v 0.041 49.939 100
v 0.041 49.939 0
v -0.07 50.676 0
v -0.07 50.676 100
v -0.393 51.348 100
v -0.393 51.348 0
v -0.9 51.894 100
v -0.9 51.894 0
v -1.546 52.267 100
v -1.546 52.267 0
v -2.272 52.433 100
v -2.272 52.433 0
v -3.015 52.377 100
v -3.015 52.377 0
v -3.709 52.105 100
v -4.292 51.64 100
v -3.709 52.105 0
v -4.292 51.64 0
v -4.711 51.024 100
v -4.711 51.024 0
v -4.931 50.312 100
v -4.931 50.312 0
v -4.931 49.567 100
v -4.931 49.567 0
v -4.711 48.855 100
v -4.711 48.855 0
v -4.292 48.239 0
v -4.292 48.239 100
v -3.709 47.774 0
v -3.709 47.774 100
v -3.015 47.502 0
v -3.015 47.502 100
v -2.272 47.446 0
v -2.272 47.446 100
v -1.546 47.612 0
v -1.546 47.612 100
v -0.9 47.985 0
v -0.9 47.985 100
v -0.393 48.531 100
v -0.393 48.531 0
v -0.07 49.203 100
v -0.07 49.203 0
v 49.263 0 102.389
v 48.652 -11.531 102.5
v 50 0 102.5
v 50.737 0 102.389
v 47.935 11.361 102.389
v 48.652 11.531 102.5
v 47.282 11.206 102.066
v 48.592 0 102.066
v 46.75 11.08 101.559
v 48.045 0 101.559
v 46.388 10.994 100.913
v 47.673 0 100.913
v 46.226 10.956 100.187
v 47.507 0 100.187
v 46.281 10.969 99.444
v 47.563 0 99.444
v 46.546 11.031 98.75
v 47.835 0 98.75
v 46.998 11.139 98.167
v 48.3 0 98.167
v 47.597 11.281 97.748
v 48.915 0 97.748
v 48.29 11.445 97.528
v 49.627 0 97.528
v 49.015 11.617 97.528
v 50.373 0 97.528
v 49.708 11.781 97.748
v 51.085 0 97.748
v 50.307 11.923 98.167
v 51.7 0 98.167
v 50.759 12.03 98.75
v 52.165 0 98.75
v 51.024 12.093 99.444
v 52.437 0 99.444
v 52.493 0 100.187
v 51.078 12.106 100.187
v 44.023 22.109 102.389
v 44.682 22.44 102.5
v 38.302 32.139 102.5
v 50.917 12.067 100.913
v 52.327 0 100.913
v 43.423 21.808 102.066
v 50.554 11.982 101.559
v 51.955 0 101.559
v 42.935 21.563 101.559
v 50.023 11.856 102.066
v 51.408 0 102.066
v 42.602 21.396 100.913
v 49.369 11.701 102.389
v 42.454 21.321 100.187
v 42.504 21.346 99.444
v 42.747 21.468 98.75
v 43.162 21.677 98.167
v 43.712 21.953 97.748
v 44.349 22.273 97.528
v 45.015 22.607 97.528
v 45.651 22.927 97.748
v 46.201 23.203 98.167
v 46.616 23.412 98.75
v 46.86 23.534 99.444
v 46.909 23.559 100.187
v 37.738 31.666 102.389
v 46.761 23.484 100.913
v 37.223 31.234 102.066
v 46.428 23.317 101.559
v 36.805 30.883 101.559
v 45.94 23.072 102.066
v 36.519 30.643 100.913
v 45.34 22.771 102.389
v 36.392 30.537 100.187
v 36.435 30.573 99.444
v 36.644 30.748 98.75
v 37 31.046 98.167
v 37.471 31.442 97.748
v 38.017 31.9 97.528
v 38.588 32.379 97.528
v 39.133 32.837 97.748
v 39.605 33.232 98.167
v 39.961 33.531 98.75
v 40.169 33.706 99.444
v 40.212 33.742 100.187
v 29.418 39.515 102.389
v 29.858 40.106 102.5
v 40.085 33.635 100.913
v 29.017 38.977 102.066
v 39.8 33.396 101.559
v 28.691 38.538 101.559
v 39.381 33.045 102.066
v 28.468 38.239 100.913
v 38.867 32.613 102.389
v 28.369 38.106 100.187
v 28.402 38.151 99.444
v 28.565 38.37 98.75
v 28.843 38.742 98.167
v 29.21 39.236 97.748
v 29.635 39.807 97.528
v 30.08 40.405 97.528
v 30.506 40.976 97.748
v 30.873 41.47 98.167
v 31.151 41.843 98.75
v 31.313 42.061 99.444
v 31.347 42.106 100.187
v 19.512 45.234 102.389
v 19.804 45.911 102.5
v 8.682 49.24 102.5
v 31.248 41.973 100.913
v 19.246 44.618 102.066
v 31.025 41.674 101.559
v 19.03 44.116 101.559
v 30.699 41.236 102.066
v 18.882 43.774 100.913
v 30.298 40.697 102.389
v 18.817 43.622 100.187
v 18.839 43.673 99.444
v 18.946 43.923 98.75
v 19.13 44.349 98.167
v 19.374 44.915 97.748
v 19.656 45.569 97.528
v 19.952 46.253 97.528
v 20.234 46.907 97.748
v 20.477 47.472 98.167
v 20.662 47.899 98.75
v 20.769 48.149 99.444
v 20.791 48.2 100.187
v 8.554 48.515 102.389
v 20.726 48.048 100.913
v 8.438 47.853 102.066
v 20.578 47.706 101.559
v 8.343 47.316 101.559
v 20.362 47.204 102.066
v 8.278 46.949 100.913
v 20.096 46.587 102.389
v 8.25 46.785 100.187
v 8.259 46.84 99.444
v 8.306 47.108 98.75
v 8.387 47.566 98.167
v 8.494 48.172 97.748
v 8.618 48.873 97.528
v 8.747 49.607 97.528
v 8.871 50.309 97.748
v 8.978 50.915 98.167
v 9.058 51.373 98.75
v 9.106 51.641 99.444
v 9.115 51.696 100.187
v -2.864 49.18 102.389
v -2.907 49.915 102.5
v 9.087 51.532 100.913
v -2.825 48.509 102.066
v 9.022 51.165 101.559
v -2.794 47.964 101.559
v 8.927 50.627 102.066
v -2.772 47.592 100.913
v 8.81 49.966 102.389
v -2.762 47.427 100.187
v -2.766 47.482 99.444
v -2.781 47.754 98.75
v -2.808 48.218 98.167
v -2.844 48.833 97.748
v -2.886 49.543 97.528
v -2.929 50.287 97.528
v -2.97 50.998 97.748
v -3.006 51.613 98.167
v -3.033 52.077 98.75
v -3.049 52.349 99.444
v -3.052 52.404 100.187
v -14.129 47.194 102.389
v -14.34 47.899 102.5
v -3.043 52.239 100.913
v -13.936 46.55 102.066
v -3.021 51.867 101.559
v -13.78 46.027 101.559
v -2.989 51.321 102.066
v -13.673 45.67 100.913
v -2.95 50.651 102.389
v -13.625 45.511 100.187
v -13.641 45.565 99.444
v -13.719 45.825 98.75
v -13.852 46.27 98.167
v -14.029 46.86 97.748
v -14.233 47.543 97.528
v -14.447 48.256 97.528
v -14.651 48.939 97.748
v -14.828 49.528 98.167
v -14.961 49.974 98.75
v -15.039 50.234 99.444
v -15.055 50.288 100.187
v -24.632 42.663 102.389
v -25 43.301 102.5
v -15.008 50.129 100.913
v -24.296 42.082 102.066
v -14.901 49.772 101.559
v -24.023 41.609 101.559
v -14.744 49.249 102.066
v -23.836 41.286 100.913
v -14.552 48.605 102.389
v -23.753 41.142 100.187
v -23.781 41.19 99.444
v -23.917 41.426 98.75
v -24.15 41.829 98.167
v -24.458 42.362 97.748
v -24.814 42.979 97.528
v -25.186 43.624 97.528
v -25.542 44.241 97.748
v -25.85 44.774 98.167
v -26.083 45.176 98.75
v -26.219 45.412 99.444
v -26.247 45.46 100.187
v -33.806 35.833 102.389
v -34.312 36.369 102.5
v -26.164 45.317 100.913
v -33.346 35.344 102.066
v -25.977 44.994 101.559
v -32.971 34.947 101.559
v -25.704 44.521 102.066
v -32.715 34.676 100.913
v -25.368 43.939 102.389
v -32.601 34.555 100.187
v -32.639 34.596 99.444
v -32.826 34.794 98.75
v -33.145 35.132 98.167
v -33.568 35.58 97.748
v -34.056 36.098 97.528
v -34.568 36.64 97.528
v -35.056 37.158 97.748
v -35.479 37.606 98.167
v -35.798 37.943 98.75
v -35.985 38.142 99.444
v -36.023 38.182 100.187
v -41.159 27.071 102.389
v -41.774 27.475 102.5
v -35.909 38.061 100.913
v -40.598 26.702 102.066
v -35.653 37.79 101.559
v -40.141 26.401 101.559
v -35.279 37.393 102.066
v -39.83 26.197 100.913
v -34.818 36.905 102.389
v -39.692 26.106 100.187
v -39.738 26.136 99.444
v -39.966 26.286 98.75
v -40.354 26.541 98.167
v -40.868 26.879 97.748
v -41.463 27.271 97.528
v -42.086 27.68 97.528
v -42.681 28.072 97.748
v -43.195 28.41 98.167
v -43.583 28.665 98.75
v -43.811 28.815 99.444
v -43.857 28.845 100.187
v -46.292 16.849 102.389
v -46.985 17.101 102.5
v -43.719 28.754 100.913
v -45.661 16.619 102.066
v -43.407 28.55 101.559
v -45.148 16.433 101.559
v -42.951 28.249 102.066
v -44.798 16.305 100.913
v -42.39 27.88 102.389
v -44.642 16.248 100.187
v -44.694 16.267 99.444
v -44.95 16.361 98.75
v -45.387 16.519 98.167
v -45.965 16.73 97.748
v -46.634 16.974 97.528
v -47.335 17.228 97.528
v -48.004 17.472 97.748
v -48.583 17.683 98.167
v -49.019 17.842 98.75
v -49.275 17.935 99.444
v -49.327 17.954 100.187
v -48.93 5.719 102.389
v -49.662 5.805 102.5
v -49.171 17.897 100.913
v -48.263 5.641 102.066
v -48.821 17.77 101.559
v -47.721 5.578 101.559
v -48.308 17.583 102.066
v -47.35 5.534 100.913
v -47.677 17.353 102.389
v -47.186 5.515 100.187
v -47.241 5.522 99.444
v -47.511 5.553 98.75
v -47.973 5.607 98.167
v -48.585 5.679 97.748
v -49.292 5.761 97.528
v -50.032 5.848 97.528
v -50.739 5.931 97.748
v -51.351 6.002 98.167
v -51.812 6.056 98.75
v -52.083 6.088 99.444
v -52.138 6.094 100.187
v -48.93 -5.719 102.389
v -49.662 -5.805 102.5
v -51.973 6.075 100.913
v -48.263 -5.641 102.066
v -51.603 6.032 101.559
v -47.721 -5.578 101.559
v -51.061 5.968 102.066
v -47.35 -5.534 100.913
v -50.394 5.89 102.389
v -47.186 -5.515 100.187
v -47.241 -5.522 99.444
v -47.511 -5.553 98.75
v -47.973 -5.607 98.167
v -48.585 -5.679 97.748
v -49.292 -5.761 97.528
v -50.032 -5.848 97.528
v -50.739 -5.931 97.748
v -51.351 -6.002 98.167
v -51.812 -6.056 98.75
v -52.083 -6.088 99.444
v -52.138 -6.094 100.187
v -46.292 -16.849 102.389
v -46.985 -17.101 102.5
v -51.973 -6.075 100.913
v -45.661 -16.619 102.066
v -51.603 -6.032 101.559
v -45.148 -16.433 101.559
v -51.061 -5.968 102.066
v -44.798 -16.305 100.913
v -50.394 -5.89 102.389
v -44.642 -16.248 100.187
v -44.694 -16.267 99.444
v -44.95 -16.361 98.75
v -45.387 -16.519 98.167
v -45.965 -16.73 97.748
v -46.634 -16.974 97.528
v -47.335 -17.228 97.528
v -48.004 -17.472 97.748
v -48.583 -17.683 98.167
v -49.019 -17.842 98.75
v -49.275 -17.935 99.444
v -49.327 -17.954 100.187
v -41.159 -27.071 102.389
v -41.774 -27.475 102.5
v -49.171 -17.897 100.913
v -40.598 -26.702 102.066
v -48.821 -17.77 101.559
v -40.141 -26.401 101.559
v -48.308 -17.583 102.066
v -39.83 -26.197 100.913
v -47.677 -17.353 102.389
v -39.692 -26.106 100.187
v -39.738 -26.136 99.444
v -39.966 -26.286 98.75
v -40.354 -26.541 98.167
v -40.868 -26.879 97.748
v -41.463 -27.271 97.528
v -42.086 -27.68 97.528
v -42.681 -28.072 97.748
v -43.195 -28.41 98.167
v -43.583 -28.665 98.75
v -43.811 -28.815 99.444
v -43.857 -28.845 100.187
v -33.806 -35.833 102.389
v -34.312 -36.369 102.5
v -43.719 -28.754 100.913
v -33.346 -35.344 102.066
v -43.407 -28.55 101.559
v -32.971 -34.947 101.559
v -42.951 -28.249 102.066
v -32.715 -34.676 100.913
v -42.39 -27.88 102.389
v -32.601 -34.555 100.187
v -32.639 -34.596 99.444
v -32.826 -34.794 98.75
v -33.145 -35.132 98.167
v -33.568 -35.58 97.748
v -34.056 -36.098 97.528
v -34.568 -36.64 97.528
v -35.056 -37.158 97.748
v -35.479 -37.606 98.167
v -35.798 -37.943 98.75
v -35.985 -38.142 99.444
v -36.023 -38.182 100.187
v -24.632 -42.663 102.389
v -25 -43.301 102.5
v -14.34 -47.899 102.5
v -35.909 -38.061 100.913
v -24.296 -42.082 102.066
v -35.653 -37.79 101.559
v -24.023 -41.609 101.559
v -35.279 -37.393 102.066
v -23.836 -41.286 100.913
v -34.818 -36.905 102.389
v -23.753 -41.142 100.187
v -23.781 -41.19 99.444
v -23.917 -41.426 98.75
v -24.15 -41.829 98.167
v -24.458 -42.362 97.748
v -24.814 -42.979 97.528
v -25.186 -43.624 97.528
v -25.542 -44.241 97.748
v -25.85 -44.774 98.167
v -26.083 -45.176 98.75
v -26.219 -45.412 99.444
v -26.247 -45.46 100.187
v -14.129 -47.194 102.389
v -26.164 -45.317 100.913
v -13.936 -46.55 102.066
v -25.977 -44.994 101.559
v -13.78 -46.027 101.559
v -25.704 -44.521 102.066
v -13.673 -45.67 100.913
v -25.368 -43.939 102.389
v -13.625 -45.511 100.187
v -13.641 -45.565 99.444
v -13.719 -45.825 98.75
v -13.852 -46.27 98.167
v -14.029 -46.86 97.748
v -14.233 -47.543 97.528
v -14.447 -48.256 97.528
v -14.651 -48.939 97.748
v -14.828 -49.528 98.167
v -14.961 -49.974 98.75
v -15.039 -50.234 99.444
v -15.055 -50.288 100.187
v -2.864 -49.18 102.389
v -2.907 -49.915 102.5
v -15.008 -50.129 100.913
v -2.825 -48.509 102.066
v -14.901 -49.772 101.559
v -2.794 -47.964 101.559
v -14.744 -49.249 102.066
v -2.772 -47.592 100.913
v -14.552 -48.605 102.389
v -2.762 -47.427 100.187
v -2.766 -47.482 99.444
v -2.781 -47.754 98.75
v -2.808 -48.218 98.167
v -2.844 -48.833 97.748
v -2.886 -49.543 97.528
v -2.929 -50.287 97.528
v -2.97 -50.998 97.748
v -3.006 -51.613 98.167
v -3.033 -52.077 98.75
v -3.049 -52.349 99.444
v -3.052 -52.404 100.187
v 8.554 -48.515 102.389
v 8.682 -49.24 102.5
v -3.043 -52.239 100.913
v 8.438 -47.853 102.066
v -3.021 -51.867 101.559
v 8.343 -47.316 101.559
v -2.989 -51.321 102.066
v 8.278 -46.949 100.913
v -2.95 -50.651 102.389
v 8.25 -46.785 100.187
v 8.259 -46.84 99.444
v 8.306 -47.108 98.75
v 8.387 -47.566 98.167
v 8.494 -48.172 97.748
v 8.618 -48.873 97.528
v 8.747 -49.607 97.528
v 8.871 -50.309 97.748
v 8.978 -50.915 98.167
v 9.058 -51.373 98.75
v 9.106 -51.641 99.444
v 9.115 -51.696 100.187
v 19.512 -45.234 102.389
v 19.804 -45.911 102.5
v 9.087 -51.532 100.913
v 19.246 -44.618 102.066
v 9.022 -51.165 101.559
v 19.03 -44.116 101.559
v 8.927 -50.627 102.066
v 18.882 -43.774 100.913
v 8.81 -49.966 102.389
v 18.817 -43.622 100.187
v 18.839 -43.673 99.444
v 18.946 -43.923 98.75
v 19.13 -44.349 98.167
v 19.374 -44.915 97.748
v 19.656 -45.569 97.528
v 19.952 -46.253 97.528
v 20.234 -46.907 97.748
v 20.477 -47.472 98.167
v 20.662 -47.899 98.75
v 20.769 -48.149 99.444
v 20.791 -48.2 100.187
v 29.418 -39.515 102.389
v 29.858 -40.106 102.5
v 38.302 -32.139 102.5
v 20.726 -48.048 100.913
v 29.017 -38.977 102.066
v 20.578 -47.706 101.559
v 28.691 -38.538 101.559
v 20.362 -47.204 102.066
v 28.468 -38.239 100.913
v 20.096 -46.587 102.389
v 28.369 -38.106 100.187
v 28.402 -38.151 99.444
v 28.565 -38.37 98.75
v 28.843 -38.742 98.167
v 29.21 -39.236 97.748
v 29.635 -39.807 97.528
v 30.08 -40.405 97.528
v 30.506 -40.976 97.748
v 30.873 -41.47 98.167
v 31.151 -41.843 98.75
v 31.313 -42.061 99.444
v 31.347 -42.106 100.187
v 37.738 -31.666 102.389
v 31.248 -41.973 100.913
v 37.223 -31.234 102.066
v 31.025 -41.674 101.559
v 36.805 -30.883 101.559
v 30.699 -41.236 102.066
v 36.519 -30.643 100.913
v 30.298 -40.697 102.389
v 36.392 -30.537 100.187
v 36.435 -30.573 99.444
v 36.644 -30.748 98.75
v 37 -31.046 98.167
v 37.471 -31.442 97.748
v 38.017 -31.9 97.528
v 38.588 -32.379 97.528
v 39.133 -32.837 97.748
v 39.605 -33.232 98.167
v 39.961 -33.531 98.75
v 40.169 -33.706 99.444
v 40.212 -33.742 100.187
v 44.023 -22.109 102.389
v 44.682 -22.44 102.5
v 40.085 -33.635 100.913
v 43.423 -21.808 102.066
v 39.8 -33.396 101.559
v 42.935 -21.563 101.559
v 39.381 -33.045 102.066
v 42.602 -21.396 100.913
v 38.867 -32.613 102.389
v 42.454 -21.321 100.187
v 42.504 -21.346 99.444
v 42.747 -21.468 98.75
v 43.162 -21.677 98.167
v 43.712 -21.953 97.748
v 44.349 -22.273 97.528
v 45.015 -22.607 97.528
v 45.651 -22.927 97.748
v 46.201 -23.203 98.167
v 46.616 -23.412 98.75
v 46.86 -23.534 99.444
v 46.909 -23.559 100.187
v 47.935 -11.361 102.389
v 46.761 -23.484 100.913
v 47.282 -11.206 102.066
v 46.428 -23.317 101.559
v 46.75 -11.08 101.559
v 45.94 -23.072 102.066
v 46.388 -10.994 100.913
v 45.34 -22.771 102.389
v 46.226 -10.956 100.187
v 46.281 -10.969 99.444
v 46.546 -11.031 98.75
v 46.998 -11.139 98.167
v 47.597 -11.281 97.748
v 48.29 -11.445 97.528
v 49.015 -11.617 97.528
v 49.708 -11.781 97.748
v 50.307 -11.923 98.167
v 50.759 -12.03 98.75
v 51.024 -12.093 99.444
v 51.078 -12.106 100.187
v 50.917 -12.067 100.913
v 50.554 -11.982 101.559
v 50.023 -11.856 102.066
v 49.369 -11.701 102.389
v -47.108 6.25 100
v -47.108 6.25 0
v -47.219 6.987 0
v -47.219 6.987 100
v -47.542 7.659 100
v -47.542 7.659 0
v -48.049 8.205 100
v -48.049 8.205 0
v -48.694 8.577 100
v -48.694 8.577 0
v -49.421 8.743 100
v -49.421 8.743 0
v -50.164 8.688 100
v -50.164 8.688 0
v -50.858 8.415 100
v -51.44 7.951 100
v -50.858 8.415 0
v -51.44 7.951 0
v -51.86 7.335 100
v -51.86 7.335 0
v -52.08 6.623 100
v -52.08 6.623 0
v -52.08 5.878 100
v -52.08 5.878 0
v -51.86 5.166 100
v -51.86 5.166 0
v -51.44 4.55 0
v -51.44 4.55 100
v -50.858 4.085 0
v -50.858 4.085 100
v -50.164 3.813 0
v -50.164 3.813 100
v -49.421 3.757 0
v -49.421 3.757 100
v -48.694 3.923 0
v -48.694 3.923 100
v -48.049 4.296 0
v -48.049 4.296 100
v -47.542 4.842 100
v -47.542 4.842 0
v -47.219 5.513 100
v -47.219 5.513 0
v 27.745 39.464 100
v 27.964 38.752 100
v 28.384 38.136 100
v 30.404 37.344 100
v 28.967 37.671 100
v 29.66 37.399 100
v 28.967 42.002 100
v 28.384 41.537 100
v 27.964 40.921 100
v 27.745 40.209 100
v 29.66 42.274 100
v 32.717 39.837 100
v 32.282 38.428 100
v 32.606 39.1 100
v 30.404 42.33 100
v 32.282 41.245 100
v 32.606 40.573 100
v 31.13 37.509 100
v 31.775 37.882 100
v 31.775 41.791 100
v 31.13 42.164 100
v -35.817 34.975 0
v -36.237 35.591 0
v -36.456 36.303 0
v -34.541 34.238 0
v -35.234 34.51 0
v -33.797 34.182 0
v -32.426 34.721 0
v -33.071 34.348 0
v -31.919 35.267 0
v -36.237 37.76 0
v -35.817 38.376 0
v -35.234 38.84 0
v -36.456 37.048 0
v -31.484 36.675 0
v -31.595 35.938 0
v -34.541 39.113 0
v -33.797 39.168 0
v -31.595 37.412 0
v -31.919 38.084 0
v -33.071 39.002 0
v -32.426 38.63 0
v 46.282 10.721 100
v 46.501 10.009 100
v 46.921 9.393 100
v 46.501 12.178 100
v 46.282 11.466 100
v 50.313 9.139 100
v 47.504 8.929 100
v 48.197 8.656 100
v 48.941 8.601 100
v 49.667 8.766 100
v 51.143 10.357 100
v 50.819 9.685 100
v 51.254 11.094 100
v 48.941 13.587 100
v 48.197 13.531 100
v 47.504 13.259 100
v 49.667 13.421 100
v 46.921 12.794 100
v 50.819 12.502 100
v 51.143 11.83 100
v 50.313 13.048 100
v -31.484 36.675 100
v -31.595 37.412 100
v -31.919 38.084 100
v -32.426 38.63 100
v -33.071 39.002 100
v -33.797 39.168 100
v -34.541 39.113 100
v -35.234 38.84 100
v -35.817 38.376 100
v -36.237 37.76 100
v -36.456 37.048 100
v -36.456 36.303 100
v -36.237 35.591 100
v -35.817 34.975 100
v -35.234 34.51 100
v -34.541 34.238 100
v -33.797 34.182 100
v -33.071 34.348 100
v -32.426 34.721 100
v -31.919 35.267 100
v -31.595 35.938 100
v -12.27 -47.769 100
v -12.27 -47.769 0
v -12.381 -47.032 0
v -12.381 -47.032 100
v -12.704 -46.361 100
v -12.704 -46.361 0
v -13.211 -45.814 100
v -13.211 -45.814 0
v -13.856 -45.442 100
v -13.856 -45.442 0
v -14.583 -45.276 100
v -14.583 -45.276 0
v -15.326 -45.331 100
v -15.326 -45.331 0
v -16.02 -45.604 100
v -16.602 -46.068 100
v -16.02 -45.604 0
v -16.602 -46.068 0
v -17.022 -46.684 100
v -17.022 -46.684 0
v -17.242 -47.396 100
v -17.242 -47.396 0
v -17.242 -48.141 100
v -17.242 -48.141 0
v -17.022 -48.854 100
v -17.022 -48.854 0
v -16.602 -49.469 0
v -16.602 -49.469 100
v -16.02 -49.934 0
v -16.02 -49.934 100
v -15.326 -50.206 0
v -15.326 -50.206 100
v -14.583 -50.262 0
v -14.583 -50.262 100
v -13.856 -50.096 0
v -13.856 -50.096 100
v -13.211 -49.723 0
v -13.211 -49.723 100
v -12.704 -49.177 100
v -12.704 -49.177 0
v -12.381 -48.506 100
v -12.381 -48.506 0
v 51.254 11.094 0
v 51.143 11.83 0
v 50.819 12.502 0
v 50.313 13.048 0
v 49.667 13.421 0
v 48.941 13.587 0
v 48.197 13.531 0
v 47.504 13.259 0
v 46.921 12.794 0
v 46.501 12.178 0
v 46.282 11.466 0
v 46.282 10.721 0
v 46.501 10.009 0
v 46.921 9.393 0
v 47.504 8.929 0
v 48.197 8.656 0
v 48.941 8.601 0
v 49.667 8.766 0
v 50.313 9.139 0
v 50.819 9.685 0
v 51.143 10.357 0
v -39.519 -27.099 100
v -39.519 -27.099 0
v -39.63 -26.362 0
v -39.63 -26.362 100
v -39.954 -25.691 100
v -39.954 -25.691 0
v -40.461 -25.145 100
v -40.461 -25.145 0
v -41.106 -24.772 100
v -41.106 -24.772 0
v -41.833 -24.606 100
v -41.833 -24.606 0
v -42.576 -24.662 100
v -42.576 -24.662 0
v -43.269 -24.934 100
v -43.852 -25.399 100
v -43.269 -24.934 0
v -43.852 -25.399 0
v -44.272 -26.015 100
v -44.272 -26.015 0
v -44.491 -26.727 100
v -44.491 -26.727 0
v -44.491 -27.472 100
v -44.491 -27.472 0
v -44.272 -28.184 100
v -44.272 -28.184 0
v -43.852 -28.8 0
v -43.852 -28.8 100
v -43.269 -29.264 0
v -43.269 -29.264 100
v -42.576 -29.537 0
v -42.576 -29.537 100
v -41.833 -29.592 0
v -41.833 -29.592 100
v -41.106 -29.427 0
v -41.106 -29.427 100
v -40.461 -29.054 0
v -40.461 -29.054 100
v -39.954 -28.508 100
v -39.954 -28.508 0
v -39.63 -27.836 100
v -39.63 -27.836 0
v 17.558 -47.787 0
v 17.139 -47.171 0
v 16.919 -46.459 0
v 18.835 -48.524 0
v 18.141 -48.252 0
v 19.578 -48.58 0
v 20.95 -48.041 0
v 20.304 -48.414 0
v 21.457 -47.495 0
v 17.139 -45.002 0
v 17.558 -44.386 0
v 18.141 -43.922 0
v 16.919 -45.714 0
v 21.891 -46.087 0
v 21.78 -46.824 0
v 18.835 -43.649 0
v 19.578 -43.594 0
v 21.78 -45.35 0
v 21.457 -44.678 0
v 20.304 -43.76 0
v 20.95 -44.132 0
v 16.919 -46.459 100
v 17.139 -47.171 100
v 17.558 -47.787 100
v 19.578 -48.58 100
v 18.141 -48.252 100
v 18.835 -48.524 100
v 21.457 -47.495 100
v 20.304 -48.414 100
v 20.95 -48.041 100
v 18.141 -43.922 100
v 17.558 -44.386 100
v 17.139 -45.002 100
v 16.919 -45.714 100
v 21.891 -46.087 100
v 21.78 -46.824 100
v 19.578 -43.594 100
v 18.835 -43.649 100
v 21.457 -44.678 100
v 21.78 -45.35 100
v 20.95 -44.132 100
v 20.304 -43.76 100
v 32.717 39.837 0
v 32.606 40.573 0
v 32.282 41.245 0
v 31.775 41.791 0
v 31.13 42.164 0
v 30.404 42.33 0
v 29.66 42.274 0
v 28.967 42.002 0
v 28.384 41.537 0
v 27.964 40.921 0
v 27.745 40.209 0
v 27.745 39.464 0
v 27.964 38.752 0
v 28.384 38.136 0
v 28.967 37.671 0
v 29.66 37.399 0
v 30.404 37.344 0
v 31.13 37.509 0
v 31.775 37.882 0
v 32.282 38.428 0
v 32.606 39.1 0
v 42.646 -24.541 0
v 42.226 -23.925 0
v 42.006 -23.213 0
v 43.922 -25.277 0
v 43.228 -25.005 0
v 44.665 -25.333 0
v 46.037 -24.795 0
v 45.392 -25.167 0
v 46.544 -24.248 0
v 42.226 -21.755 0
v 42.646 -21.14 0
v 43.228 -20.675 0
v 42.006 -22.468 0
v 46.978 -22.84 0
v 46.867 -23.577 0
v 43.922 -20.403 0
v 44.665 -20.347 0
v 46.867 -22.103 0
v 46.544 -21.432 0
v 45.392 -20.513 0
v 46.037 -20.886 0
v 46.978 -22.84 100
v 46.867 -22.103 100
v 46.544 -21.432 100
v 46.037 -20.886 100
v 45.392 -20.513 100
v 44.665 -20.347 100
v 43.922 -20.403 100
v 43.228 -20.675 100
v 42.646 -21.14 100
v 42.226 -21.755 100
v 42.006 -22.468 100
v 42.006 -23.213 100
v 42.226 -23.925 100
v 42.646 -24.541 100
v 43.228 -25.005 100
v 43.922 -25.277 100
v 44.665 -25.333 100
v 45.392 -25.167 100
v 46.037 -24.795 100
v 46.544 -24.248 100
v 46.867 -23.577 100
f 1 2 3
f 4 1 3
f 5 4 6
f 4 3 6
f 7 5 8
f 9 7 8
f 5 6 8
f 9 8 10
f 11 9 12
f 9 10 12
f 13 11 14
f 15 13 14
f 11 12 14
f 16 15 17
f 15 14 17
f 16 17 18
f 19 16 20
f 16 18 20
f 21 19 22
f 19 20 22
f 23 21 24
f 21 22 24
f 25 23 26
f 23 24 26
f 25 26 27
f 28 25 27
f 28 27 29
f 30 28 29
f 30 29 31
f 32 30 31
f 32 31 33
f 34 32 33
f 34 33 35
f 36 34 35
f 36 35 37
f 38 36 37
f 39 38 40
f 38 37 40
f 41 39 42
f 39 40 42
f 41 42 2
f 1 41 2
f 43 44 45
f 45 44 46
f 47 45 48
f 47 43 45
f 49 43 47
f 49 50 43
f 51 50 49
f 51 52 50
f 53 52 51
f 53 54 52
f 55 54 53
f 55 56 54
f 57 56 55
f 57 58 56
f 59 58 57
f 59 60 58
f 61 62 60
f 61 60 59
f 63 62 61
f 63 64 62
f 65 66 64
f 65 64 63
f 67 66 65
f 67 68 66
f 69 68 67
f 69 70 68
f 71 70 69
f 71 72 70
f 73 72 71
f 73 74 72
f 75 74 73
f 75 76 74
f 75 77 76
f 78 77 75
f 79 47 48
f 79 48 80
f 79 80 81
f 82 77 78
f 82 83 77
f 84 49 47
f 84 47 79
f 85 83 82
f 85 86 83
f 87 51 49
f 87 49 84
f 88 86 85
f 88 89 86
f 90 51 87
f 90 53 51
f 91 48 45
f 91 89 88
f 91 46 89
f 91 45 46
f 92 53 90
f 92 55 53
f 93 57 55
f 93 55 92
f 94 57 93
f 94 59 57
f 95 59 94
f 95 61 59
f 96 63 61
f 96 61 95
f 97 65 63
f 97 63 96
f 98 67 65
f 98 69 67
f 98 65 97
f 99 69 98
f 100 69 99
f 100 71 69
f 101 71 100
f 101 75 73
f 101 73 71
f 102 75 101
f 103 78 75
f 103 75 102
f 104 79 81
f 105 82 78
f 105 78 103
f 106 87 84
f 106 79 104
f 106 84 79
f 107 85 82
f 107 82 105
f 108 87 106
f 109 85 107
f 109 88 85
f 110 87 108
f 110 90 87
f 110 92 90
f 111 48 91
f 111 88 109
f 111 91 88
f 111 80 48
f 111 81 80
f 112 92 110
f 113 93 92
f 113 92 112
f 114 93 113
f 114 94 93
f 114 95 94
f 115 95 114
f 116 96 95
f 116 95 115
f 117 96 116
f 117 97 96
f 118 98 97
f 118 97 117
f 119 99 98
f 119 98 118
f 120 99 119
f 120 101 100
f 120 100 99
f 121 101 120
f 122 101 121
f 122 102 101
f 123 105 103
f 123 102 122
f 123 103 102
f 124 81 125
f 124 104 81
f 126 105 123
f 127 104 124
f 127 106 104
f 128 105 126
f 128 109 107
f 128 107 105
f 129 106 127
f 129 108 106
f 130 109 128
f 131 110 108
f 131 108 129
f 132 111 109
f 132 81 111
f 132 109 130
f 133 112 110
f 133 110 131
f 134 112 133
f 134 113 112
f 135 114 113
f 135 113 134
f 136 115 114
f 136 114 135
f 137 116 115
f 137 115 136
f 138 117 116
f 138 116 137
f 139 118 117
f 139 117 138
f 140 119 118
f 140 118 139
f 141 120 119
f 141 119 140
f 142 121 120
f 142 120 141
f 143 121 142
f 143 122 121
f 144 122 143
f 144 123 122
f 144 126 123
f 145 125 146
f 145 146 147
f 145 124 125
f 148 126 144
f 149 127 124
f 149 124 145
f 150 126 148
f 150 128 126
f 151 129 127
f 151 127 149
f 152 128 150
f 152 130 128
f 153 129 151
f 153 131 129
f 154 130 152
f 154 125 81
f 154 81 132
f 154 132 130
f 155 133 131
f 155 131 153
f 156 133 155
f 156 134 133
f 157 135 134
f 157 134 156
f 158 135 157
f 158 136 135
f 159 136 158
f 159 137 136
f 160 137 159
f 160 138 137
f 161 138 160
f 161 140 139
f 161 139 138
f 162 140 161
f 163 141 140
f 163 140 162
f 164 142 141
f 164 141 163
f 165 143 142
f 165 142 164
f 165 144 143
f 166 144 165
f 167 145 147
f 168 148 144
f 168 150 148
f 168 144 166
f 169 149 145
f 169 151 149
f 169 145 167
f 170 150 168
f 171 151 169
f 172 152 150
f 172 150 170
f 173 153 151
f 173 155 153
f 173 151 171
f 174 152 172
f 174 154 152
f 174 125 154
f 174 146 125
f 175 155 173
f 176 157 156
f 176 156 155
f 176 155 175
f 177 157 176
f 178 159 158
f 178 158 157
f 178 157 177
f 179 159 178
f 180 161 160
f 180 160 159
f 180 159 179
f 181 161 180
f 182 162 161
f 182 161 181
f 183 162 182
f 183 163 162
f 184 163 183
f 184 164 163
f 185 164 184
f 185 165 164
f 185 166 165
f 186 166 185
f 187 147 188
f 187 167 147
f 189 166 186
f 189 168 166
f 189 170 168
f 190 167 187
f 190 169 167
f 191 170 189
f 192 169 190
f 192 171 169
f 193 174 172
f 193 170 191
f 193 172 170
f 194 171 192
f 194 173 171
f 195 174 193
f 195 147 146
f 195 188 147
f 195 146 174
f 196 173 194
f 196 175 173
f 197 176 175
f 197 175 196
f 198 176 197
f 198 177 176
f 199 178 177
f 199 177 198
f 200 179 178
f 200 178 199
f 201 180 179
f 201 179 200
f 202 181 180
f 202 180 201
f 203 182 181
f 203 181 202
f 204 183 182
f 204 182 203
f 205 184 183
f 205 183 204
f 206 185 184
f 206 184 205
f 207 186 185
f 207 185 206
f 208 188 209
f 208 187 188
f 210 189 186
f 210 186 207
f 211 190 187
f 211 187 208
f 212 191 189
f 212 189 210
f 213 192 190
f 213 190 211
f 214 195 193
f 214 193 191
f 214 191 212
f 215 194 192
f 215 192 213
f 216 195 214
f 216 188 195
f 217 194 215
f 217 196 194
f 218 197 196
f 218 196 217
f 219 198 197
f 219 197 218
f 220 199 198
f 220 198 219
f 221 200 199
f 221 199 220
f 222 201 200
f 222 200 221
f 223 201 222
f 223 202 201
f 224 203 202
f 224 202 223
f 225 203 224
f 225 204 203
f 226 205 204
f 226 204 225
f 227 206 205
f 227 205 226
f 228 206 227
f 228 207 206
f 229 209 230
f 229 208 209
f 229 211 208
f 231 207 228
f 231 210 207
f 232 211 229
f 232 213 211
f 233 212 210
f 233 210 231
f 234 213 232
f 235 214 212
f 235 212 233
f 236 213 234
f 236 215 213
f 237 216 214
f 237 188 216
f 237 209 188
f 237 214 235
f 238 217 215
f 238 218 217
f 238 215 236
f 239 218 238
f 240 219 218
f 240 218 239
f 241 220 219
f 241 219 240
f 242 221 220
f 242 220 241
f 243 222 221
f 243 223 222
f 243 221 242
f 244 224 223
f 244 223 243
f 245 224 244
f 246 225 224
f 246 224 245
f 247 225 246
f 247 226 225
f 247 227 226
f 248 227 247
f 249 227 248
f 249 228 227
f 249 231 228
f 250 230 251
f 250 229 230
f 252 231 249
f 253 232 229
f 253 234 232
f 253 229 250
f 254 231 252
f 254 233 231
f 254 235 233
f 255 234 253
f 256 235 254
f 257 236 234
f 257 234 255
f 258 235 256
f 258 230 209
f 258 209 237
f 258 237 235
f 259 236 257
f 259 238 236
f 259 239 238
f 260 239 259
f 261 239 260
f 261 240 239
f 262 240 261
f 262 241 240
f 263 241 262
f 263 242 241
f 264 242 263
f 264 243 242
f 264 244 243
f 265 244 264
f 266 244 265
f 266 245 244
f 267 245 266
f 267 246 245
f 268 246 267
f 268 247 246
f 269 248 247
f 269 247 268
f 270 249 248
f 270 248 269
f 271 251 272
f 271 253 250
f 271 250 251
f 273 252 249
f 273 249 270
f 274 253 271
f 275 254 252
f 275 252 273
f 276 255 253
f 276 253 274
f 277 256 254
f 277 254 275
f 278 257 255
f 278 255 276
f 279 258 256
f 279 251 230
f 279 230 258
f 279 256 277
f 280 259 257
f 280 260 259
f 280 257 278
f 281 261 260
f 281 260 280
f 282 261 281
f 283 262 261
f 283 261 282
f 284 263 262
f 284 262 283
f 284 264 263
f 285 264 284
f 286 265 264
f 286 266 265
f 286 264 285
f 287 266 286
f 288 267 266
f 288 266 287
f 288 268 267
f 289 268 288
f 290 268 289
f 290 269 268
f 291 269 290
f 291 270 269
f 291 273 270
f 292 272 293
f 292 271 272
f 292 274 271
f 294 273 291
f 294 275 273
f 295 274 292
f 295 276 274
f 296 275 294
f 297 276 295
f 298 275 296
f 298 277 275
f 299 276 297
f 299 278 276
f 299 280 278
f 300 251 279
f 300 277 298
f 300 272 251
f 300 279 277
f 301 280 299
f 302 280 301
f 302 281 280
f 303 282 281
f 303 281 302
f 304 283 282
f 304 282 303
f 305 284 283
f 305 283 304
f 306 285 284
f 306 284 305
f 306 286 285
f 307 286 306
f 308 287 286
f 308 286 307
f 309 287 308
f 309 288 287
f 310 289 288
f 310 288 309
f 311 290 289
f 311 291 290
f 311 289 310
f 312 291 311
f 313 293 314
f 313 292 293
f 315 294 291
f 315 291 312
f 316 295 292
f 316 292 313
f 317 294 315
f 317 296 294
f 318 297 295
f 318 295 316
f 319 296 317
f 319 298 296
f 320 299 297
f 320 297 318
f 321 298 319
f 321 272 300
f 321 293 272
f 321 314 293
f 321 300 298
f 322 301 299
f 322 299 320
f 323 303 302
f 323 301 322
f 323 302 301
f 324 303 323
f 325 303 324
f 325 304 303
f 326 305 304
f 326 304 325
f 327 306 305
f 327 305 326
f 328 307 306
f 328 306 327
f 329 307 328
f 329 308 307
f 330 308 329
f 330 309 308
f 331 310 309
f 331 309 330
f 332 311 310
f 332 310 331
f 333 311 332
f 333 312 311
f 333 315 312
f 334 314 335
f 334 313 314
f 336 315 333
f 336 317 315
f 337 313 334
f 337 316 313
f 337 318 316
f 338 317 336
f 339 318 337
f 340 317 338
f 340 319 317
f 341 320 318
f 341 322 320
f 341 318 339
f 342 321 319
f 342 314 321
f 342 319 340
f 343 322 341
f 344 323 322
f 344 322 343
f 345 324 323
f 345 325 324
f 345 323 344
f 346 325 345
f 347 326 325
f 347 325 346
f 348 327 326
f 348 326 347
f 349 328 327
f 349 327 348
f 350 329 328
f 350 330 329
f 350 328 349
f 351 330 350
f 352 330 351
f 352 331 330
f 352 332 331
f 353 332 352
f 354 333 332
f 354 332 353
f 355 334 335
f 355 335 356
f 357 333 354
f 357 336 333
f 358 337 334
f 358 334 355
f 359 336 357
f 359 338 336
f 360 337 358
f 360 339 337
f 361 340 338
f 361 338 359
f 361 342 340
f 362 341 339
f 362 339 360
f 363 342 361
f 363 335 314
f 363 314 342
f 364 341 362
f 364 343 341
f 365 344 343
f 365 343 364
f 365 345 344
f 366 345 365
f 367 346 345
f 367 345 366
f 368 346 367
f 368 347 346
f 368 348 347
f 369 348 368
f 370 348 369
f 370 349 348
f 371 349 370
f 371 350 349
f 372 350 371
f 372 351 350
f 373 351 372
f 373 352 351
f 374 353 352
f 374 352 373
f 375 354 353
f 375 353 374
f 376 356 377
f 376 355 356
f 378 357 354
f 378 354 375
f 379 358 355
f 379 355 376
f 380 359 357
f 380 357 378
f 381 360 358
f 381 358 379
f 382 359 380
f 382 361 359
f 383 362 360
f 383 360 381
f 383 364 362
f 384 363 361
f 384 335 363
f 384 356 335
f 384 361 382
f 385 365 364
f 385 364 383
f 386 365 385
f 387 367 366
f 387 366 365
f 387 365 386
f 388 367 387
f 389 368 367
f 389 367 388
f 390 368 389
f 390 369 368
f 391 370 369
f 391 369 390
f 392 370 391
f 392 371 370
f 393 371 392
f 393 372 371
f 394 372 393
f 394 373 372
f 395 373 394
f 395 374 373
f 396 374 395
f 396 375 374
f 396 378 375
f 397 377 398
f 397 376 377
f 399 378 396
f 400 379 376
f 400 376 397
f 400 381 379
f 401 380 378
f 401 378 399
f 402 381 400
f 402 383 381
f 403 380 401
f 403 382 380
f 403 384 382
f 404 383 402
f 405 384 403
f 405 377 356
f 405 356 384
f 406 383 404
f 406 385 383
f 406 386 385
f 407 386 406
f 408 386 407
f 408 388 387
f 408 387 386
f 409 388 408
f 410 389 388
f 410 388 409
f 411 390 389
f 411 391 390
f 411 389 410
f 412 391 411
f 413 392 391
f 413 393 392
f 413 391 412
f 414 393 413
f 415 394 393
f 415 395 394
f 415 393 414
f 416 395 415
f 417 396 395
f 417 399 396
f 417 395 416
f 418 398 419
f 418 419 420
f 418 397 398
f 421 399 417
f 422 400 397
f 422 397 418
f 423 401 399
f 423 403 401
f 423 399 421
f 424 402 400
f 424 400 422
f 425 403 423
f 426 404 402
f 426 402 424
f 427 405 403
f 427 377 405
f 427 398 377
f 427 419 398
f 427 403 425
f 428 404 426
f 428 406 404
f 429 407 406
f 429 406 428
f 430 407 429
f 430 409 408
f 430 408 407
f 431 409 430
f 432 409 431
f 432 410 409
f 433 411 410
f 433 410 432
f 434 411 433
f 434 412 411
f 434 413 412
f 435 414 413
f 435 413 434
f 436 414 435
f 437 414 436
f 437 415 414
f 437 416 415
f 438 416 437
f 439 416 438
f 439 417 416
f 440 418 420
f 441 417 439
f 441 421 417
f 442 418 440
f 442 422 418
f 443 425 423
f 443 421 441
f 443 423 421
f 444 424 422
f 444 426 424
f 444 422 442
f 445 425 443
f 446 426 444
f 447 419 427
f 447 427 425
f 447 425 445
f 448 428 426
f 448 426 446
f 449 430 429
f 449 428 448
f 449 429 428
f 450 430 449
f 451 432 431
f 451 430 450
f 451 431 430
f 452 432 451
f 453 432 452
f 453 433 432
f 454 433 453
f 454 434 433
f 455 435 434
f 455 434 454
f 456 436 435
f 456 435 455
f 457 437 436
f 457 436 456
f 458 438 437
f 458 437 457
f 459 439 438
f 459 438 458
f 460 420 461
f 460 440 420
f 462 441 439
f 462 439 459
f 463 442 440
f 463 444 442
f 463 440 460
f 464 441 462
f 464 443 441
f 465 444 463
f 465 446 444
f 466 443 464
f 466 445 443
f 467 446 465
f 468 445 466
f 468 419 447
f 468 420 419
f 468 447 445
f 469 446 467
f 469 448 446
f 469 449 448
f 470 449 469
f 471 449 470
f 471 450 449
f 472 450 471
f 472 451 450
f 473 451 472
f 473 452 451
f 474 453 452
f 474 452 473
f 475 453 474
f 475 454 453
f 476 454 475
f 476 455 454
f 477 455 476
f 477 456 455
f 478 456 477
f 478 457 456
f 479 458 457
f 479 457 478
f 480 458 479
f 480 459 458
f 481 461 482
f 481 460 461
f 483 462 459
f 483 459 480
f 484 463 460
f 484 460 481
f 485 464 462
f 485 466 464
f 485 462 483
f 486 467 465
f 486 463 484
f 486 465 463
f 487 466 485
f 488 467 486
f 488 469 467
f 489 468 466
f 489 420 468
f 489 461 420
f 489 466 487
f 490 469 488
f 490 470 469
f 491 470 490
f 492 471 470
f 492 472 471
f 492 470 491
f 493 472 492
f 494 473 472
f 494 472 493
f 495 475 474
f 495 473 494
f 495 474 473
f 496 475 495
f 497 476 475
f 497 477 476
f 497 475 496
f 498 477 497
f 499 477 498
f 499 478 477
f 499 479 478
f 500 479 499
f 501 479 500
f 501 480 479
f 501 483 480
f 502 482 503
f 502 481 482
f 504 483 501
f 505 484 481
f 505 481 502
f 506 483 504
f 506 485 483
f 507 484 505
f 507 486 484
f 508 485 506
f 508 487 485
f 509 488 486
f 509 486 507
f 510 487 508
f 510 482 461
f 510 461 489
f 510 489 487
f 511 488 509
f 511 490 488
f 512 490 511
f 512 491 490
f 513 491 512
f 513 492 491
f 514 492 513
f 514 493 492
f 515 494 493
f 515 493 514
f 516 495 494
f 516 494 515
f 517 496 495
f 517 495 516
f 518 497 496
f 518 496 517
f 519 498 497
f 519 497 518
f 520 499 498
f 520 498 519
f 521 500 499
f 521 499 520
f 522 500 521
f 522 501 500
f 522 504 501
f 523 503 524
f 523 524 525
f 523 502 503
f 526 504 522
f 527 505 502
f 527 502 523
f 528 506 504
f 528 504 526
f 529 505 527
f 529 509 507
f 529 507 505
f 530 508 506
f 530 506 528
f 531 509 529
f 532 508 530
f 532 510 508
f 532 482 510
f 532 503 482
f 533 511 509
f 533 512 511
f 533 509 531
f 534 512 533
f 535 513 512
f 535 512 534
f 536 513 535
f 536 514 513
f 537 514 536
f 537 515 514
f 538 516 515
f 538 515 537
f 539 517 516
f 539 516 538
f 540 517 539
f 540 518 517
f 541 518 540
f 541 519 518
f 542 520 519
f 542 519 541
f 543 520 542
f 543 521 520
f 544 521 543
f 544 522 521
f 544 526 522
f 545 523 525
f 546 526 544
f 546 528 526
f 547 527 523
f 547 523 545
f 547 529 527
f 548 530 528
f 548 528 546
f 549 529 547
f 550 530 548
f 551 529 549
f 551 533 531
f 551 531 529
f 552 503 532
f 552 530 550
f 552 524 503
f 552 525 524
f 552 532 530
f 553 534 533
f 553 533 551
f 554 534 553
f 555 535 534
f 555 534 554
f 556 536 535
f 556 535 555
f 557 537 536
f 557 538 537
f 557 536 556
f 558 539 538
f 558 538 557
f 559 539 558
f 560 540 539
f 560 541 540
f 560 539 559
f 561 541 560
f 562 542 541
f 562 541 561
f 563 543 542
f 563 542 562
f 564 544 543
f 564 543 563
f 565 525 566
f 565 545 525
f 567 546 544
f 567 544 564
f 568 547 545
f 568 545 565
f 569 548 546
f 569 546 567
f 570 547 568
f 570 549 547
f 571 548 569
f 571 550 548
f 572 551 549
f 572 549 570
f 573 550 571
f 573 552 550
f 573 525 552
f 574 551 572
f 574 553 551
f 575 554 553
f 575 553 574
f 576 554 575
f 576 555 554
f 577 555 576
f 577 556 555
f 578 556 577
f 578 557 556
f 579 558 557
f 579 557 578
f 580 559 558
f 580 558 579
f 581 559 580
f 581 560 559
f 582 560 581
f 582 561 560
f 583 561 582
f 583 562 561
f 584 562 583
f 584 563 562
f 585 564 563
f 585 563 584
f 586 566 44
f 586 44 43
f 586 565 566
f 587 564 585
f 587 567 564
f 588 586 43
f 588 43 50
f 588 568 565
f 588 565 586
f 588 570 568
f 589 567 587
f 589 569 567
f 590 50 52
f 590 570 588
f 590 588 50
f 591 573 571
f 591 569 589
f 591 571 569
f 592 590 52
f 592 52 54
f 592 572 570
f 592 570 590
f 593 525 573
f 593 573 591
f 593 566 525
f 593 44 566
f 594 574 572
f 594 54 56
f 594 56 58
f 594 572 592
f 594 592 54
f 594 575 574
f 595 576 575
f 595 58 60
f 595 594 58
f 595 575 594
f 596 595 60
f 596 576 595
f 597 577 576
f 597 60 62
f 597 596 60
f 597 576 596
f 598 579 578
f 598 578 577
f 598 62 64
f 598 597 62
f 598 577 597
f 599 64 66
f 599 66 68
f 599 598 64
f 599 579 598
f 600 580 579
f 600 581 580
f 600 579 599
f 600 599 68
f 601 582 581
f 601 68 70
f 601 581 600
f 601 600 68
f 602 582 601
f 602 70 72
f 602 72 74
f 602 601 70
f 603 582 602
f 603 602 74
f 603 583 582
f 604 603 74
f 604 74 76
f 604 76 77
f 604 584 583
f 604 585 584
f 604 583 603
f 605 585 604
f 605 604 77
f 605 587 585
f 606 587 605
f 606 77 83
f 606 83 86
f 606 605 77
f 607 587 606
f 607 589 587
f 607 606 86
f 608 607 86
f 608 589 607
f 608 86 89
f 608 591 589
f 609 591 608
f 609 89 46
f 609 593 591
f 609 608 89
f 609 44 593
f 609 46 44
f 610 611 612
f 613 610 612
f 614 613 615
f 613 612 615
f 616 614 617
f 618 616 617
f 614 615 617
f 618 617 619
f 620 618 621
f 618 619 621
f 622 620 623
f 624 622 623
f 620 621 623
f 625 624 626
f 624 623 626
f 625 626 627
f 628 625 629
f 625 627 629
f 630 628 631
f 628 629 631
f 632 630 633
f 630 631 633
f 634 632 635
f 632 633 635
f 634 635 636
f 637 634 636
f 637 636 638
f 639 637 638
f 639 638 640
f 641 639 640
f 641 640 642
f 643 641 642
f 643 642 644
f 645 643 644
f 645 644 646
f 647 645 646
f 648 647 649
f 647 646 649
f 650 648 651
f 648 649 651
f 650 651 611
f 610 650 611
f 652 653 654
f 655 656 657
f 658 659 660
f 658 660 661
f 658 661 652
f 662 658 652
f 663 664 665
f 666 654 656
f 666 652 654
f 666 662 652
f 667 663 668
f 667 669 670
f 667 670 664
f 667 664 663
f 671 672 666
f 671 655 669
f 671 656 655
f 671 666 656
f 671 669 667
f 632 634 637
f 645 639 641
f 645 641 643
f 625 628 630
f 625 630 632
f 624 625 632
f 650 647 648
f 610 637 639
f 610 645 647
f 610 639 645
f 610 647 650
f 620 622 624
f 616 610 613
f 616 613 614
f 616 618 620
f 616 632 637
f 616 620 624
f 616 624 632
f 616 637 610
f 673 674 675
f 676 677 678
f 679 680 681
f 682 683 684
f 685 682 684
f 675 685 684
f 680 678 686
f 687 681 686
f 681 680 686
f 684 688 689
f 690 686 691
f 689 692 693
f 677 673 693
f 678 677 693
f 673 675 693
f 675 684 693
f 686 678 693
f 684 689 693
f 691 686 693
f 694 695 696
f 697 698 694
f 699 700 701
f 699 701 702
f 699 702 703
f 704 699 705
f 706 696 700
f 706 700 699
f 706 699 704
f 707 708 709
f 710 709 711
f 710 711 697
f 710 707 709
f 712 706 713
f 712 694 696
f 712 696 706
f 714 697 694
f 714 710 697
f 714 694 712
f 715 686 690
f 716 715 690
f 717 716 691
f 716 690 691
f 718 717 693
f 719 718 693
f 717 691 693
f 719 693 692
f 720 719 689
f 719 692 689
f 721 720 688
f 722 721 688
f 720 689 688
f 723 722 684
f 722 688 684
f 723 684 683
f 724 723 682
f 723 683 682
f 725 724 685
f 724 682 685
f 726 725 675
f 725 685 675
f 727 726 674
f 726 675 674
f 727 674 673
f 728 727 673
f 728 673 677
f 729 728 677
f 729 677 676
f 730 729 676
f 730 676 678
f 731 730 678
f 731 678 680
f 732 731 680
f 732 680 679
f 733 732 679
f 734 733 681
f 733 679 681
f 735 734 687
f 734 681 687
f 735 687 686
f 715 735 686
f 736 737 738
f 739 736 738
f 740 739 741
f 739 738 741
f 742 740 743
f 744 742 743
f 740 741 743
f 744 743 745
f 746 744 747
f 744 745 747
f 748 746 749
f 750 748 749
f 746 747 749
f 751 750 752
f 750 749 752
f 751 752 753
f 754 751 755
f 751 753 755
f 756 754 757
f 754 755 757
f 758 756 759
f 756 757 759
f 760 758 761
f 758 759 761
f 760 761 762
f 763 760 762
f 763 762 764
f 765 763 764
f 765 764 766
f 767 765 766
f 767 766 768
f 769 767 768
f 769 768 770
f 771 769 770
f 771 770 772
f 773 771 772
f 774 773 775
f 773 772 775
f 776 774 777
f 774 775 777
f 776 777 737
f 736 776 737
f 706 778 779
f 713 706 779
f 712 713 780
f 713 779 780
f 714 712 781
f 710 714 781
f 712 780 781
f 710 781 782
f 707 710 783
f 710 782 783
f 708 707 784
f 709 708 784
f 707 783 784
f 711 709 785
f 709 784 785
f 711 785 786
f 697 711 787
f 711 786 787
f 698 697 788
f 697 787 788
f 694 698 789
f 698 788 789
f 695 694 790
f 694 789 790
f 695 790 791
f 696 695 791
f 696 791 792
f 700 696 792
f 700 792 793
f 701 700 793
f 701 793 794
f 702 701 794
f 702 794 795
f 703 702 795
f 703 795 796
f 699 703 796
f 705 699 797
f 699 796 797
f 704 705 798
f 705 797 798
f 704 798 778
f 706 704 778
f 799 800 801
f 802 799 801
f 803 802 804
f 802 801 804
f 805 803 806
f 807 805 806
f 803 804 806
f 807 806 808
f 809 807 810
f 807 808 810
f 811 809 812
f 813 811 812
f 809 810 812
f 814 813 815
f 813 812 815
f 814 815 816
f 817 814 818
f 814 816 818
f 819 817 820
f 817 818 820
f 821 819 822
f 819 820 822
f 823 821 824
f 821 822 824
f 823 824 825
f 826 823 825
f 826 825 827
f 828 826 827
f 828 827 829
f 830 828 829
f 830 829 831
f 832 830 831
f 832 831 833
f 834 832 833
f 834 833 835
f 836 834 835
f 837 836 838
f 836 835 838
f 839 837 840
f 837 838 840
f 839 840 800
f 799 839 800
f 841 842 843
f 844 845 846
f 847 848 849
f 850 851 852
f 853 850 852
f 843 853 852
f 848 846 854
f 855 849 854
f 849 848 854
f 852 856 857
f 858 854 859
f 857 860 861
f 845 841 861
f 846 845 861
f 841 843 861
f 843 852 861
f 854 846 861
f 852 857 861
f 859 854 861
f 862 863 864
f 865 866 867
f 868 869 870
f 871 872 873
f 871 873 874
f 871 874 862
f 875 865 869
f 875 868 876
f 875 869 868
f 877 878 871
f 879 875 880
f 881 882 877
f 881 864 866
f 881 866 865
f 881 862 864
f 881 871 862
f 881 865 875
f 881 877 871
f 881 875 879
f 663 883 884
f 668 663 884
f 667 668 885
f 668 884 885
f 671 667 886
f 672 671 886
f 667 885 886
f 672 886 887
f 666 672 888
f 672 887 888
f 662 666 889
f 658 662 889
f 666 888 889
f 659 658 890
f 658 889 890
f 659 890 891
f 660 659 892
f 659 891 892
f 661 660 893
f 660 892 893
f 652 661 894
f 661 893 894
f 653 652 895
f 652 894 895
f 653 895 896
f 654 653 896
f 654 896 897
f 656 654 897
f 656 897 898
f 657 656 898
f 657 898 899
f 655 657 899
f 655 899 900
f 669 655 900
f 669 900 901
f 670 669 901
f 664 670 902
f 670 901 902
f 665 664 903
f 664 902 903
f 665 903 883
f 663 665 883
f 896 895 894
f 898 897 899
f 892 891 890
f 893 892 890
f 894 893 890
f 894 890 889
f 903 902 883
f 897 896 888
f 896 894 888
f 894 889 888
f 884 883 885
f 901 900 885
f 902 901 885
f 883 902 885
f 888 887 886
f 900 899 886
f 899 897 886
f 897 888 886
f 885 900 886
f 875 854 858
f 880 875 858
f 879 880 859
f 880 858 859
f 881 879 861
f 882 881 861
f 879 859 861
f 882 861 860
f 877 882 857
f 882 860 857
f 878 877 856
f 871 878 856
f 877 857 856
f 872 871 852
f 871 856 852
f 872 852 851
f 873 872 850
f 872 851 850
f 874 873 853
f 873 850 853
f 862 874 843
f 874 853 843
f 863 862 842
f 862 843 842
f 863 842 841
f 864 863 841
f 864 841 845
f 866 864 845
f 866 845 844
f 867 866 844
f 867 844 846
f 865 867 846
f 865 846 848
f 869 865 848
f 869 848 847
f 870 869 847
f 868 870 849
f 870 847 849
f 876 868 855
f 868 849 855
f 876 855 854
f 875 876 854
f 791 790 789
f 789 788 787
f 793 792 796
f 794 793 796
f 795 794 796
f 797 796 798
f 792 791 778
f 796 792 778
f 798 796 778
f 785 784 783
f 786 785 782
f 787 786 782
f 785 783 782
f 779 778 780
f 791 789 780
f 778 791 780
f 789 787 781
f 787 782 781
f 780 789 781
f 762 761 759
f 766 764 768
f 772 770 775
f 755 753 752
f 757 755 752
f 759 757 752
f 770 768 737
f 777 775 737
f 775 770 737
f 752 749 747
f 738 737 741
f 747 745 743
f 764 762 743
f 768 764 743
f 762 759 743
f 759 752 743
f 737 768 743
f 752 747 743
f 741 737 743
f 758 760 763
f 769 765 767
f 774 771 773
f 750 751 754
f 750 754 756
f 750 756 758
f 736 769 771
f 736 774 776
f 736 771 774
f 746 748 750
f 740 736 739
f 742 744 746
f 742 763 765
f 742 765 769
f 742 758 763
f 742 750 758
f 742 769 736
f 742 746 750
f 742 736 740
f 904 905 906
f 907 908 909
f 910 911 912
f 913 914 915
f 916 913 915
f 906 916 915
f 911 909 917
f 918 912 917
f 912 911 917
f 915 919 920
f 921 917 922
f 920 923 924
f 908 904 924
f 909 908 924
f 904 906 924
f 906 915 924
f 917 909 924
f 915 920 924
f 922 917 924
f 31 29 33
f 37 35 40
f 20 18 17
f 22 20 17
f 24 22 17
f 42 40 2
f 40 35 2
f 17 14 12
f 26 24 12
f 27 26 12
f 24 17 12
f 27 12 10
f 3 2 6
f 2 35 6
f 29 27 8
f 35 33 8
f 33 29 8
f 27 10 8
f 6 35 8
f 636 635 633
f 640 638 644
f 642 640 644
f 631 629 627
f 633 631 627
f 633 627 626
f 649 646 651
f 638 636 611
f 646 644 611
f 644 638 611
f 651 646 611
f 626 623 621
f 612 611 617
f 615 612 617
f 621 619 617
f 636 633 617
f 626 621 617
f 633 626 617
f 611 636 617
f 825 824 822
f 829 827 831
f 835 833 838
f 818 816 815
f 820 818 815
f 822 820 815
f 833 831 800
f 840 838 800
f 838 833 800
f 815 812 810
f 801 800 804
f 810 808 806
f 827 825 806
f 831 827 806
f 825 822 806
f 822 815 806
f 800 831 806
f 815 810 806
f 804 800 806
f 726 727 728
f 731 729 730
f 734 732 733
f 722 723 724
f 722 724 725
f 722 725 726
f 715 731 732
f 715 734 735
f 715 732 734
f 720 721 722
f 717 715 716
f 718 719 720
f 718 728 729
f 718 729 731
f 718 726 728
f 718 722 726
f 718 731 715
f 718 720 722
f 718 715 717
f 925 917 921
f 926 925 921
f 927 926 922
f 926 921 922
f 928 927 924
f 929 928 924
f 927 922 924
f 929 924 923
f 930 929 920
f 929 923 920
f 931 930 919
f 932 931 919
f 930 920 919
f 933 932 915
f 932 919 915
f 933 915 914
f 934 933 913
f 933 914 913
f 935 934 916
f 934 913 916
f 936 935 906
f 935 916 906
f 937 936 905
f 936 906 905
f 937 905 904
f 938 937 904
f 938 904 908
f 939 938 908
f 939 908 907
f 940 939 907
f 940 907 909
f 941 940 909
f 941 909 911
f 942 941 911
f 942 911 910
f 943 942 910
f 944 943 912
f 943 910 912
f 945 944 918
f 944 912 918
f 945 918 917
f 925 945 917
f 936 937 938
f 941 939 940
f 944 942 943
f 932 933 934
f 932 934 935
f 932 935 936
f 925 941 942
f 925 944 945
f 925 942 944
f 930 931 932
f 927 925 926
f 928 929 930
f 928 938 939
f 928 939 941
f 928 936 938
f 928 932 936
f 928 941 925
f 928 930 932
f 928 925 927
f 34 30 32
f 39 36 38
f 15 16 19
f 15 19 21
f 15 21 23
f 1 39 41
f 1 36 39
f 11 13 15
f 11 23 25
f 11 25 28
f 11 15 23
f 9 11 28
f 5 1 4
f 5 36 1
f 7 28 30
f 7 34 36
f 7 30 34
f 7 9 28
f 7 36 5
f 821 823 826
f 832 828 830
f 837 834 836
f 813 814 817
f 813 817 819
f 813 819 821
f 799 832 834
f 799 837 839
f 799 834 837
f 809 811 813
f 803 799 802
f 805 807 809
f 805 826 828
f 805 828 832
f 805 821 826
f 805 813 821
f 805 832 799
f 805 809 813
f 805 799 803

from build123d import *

# Parameters (mm, degrees)
SKIZZE1_R                         = 2.5
AUFSATZ_LINEAR_AUSTRAGEN1_DEPTH   = 100
AUFSATZ_LINEAR_AUSTRAGEN1_2_DEPTH = 100
AUFSATZ_LINEAR_AUSTRAGEN1_3_DEPTH = 100
AUFSATZ_LINEAR_AUSTRAGEN1_4_DEPTH = 100
AUFSATZ_LINEAR_AUSTRAGEN1_5_DEPTH = 100
AUFSATZ_LINEAR_AUSTRAGEN1_6_DEPTH = 100
AUFSATZ_LINEAR_AUSTRAGEN1_7_DEPTH = 100
AUFSATZ_LINEAR_AUSTRAGEN1_8_DEPTH = 100
AUFSATZ_LINEAR_AUSTRAGEN1_9_DEPTH = 100
AUSTRAGUNG1_PROFILE_R             = 2.5


with BuildPart() as part:
    # Skizze1 → Aufsatz-Linear austragen1 (new body)
    with BuildSketch(Plane.XY):
        with Locations((-42.019348311, -27.099342566)):
            Circle(SKIZZE1_R)
    extrude(amount=AUFSATZ_LINEAR_AUSTRAGEN1_DEPTH)


with BuildPart() as body_2:
    # Skizze1 → Aufsatz-Linear austragen1 2 (new body)
    with BuildSketch(Plane.XY):
        with Locations((-14.769566645, -47.768817246)):
            Circle(SKIZZE1_R)
    extrude(amount=AUFSATZ_LINEAR_AUSTRAGEN1_2_DEPTH)


with BuildPart() as body_3:
    # Skizze1 → Aufsatz-Linear austragen1 3 (new body)
    with BuildSketch(Plane.XY):
        with Locations((19.391059399, -46.086731446)):
            Circle(SKIZZE1_R)
    extrude(amount=AUFSATZ_LINEAR_AUSTRAGEN1_3_DEPTH)


with BuildPart() as body_4:
    # Skizze1 → Aufsatz-Linear austragen1 4 (new body)
    with BuildSketch(Plane.XY):
        with Locations((44.478393243, -22.840151805)):
            Circle(SKIZZE1_R)
    extrude(amount=AUFSATZ_LINEAR_AUSTRAGEN1_4_DEPTH)


with BuildPart() as body_5:
    # Skizze1 → Aufsatz-Linear austragen1 5 (new body)
    with BuildSketch(Plane.XY):
        with Locations((48.753792567, 11.093588705)):
            Circle(SKIZZE1_R)
    extrude(amount=AUFSATZ_LINEAR_AUSTRAGEN1_5_DEPTH)


with BuildPart() as body_6:
    # Skizze1 → Aufsatz-Linear austragen1 6 (new body)
    with BuildSketch(Plane.XY):
        with Locations((30.21675051, 39.836515769)):
            Circle(SKIZZE1_R)
    extrude(amount=AUFSATZ_LINEAR_AUSTRAGEN1_6_DEPTH)


with BuildPart() as body_7:
    # Skizze1 → Aufsatz-Linear austragen1 7 (new body)
    with BuildSketch(Plane.XY):
        with Locations((-2.459044932, 49.939494371)):
            Circle(SKIZZE1_R)
    extrude(amount=AUFSATZ_LINEAR_AUSTRAGEN1_7_DEPTH)


with BuildPart() as body_8:
    # Skizze1 → Aufsatz-Linear austragen1 8 (new body)
    with BuildSketch(Plane.XY):
        with Locations((-33.984225921, 36.675228541)):
            Circle(SKIZZE1_R)
    extrude(amount=AUFSATZ_LINEAR_AUSTRAGEN1_8_DEPTH)


with BuildPart() as body_9:
    # Skizze1 → Aufsatz-Linear austragen1 9 (new body)
    with BuildSketch(Plane.XY):
        with Locations((-49.607809909, 6.250215677)):
            Circle(SKIZZE1_R)
    extrude(amount=AUFSATZ_LINEAR_AUSTRAGEN1_9_DEPTH)


with BuildPart() as body_10:
    # Austragung1: sweep along a path in Skizze2
    with BuildLine(Plane.XY.offset(100)) as austragung1_path:
        CenterArc((0, 0), 50, 0, 360)
    # Austragung1 profile (on start of the path) → Austragung1 (sweep)
    with BuildSketch(Plane(origin=(50, 0, 100), x_dir=(0, 0, 1), z_dir=(0, 1, 0))):
        Circle(AUSTRAGUNG1_PROFILE_R)
    sweep(path=austragung1_path.line)


solid = Compound([part.part, body_2.part, body_3.part, body_4.part, body_5.part, body_6.part, body_7.part, body_8.part, body_9.part, body_10.part])
